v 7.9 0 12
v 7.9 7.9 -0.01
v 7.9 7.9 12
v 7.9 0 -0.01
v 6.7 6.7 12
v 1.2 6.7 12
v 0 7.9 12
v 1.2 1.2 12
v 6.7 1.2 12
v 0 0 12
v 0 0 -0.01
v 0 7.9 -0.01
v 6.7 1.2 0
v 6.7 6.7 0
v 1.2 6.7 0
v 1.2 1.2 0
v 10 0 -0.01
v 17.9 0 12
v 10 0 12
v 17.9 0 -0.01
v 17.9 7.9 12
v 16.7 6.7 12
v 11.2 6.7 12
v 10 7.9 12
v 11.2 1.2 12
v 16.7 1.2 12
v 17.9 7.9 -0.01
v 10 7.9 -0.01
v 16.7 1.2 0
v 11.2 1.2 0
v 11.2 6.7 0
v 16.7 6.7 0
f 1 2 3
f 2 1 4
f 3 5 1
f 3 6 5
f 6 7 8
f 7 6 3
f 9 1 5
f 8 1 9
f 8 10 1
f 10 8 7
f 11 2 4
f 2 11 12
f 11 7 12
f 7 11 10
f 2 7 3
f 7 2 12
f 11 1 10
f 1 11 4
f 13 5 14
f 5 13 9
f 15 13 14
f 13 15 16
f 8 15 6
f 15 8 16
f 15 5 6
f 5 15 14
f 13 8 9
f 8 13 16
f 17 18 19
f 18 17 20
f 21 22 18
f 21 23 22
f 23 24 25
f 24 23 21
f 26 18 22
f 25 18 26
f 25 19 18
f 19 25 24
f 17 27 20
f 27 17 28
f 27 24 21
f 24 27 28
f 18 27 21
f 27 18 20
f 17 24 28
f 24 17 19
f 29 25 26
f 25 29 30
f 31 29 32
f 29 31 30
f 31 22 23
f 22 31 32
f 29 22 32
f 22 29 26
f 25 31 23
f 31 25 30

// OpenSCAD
// file: ../../Base/Boxes.scad
// Fischertechnik Box Foundation
// Pre-designed Boxes

use <Constants.scad>

include <PlacementOptions.scad>

box190Width = 190;
box190Depth = 130;
box130Width = 130;
box130Depth = 95;
boxUsageHeight = 33.9;
boxWallThickness = 2.4;
boxBaseThickness = 1.0;

// getBoxWallThickness()
// Gets the wall thickness of a Fischertechnik Box

function getBoxWallThickness() = boxWallThickness;

// Gets the usable height of a fischertechnik box
function getBoxUsageHeight() = boxUsageHeight;

// Gets the thickness of the Fischertechnik box base.
function getBoxBaseThickness() = boxBaseThickness;

// Gets the usable inner space of a Box 190 as an x/y-list
function getBox190Space() = [
    box190Width - 2*getBoxWallThickness(), 
    box190Depth - 2*getBoxWallThickness() ];

// Imports the Fischertechnik empty box 130x190 mm and places it at position 0,0
// 190x130 are the outer sizes, the inner space is slightly smaller. Use getBox190Space() to get the inner sizes.
// This module needs the STL file "Fischertechnik Box 130x190.stl" in the library path.
// The box is positioned that the usable inner space is at the 0,0,0 position. The

module Box190() {
    translate([-getBoxWallThickness(),-getBoxWallThickness(),-getBoxBaseThickness()])
        import("Fischertechnik Box 130x190.stl", convexity=3);
}

// Gets the usable inner space of a Box 130 as an x/y-list
function getBox130Space() = [
    box130Width - 2*getBoxWallThickness(), 
    box130Depth - 2*getBoxWallThickness() ];

// Imports the Fischertechnik empty box 95x130 mm and places it at position 0,0
// 190x130 are the outer sizes, the inner space is slightly smaller. Use getBox190Space() to get the inner sizes.
// This module needs the STL file "Fischertechnik Box 95x130.stl" in the library path.
// The box is positioned that the usable inner space is at the 0,0,0 position. The

module Box130() {
    translate([-getBoxWallThickness(),-getBoxWallThickness(),-getBoxBaseThickness()])
        import("Fischertechnik Box 95x130.stl", convexity=3);
}

// Creates a web at the specified box walls
// corner 0 = LowerLeft, 1 = UpperLeft, 2 = UpperRight, 3 = LowerRight
// side 0 = LeftOfCorner, 1 = RightOfCorner
// distance = Distance in mm from the corner
// box = inner width and depth of the box (default: Box 190)
// webWidth = length of the web (default is 3 mms)
// webThickness = thickness of the web (default is 1 mm)

module BoxWeb(corner, side, distance, box=getBox190Space(), webWidth=3, webThickness=1.0) {
    sink = getBoxWallThickness()/2;

    width = (corner % 2 == 0) ? 
            (side == LeftOfCorner ? webWidth : webThickness) :
            (side == LeftOfCorner ? webThickness : webWidth);

    depth = (corner % 2 == 0) ? 
            (side == RightOfCorner ? webWidth : webThickness) :
            (side == RightOfCorner ? webThickness : webWidth);
    
    xDiff = corner == LowerLeft ? 
                (side == LeftOfCorner ? -sink : distance) :
            (corner == UpperLeft ?                
                (side == LeftOfCorner ? distance : -sink) :
            (corner == UpperRight ?
                (side == LeftOfCorner ? box.x-webWidth+sink : box.x-distance-webThickness) :
                (side == LeftOfCorner ? box.x-distance-webThickness: box.x-webWidth+sink)));

    yDiff = corner == LowerLeft ? 
                (side == RightOfCorner ? -sink : distance) :
            (corner == UpperLeft ?
                (side == RightOfCorner ? box.y-distance : box.y-webWidth+sink) :
            (corner == UpperRight ?
                (side == RightOfCorner ? box.y-webWidth+sink : box.y-distance) :
                (side == RightOfCorner ? distance : -sink)));
    
    translate([xDiff, yDiff, -getExcess()])
        cube([width, depth, boxUsageHeight + 2*getExcess()]);
}
// file: ../../Base/Rotation.scad
// Fischertechnik Box Foundation
// Geometry Helpers Rotation

include <PlacementOptions.scad>

// getRotatedSpace(space, rotation=NoRotation)
// Rotates the space dependent on the specified rotation

function getRotatedSpace(space, rotation=NoRotation) = [
    (rotation == Rotate90 || rotation == Rotate270) ? space.y : space.x,
    (rotation == Rotate90 || rotation == Rotate270) ? space.x : space.y
];

// Rotates the given space around the fixed left lower corner
// space = the space the children needs as width/depth list [width,depth]
// rotation = 0 Rotate0 degrees, 1 Rotate90 degrees, 2 Rotate180 degrees, 3 Rotate270 degrees (equivalent to -90)

module RotateFix(space, rotation=Rotate0) {
    dy = (rotation == Rotate0 || rotation == Rotate270) ? 0 :
        (rotation == Rotate90) ? space.x :
        space.y;
    dx = (rotation < Rotate180) ? 0 :
        (rotation == Rotate180) ? space.x :
        space.y;
    
    translate([dx, dy, 0])
        rotate([0, 0, rotations[rotation]])
            children();
}
// file: ../../Base/Alignment.scad
// Fischertechnik Box Foundation
// Geometry Helpers Alignment

include <PlacementOptions.scad>

// getAlignedX(elementWidth, spaceWidth, align=AlignRight, offset=0)
// Gets the aligned X offset of an element with the given
// width in the given space.
// elementWidth = The width of the element to positon
// spaceWidth = The space where the element should be aligned
// align = 0 AlignLeft, 1 AlignCenter, 2 AlignRight
// offset = an optional offset from the aligned position. When
// aligned left or centered, then positive values are in X direction.
// When aligned right then positive values are in negative X direction.

function getAlignedX(elementWidth, spaceWidth, align=AlignRight, offset=0) =
    (align == AlignLeft) ?
        offset :
        ((align == AlignCenter) ?
        (spaceWidth - elementWidth)/2 + offset :
        spaceWidth - offset - elementWidth);

// getAlignedY(elementDepth, spaceDepth, align=AlignTop, offset=0)
// Gets the aligned Y offset of an element with the given
// depth in the given space.
// elementDepth = The depth of the element to positon
// spaceDepth = The space where the element should be aligned
// align = 0 AlignBottom, 1 AlignCenter, 2 AlignTop
// offset = an optional offset from the aligned position. When
// aligned bottom or centered, then positive values are in Y direction.
// When aligned top then positive values are in negative Y direction.

function getAlignedY(elementDepth, spaceDepth, align=AlignTop, offset=0) =
    (align == AlignBottom) ?
        offset :
        ((align == AlignCenter) ?
        (spaceDepth - elementDepth)/2 + offset :
        spaceDepth - offset - elementDepth);
// file: ../../Base/Constants.scad
// Fischertechnik Box Foundation
// Constants

// Constant values necessary for multiple elements

// Base constants
dividerThickness = 1.2;
excess = 0.01;
fragments = 90;
tolerance = 0.8;

// Gets the thickness of a divider 
function getDividerThickness() = dividerThickness;

// Gets the excess that is used to merge walls into each other
function getExcess() = excess;

// Gets amount of fragments of a cylinder
function getFragments() = fragments;

// Gets the inner tolerance of a frame to each side
function getTolerance() = tolerance;


// Fischertechnik specific constants
axisDiameter = 4;
axisBottomDiameter = axisDiameter + 1;
standardEdgeDistance = 2.5;
standardWebDistance = 11.5;
standardCornerLength = 15;
tubeWallFactor = 1.6;

// Gets axis diameter
function getAxisDiameter() = axisDiameter;

// Gets axis bottom diameter for thicker part at the bottom
function getAxisBottomDiameter() = axisBottomDiameter;

// gets the standard distance to the wall of the box for dockable frames with webs
function getStandardEdgeDistance() = standardEdgeDistance;

// gets the standard distance of each web to the corner of the dockable frame
function getStandardWebDistance() = standardWebDistance;

// gets the standard length of the corner walls of a dockable frame
function getStandardCornerLength() = standardCornerLength;

// gets the wall thickness of a tube.
function getTubeWallThickness() = tubeWallFactor * getDividerThickness();
// file: ../../Base/PlacementOptions.scad
// Fischertechnik Box Foundation
// Placement Options

// Alignment
NoAlign = 0;
AlignLeft = 1;
AlignBottom = 2;
AlignCenter = 3;
AlignRight = 4;
AlignTop = 5;

// Element rotation degree steps
rotations = [0, -90, -180, -270];

// Rotation
NoRotation = 0;
Rotate0 = 0;
Rotate90 = 1;
Rotate180 = 2;
Rotate270 = 3;

// Docking (seen from above)
NoDock = -1;
DockLeft = 0;
DockTop = 1;
DockRight = 2;
DockCorner = 2;
DockBottom = 3;

// Web corners
LowerLeft = 0;
UpperLeft = 1;
UpperRight = 2;
LowerRight = 3;

// Web position relative to corner
LeftOfCorner = 0;
RightOfCorner = 1;
// file: ../../Elements/FrameControlLight.scad
// Fischertechnik Box Library
// Frame for Control Light for electronic building block
// 36390

use <../Base/Constants.scad>
use <../ModelBase/Simple.scad>

width = 5.5;
depth = 5.5;
height = 12;

// getFrameControlLightSpace()
// Gets the space the frame for a control light needs as width and depth (.x and .y as a list)

function getFrameControlLightSpace() = getFrameOuterVolume([width, depth, height], tolerance=0);

// FrameControlLight()
// The walls of the frame are 12 mm high. 

module FrameControlLight() {
    Frame([width, depth, height], tolerance=0);
}

// Tests
color("lightgray") {
FrameControlLight();
}
// file: ../../Base/Placement.scad
// Fischertechnik Box Foundation
// Geometry Helpers Placement

use <Constants.scad>
use <Alignment.scad>
use <Rotation.scad>
use <Boxes.scad>

include <PlacementOptions.scad>

// Place(x=0, y=0, elementSpace=[0,0], alignX=AlignLeft, alignY=AlignBottom, rotation=Rotate0, boxSpace=getBox190Space())
// Places the child at the specified position
// y = Y-Position. This is a relative position when an X aligment is specified.
// x = X-Position. This is a relative position when an Y aligment is specified.
// elementSpace = space of the element to be placed [x,y]
// alignX = -1=NoAlign, 0 AlignLeft, 1 AlignCenter, 3 AlignRight (elementSpace and boxSpace required!)
// alignY = -1=NoAlign, 2 AlignBottom, 1 AlignCenter, 4 AlignTop (elementSpace and boxSpace required!)
// rotation = 0 Rotate0 0 degrees, 1 Rotate90 90 degrees, 
// 2 Rotate180 180 degrees, 3 Rotate270 270 degrees (equivalent to -90)
// boxSpace = Inner space of the box where the placement occurs [x,y] - default is Box 190x130 inner space

module Place(x=0, y=0, elementSpace=[0,0], 
  alignX=AlignLeft, alignY=AlignBottom, 
  rotation=NoRotation, boxSpace=getBox190Space()) {

    module Position(x, y, space, rotation=Rotate0) {
        translate([x, y, 0])
            RotateFix(space, rotation)
                children(0);
    }

    space = getRotatedSpace(elementSpace, rotation);
    alignedX = getAlignedX(space.x, boxSpace.x, alignX, x);
    alignedY = getAlignedY(space.y, boxSpace.y, alignY, y);
    Position(alignedX, alignedY, elementSpace, rotation)
        children(0);
}

// Center(space=getBox130Space(), elementSpace=[0,0])
// space = Space where the children is centered. For cylinder use centered=true and no elementSpace.
// elementSpace = space of the element to be centered [x,y]

module Center(space=getBox190Space(), elementSpace=[0,0]) {
    translate([(space.x - elementSpace.x) / 2, (space.y - elementSpace.y) / 2])
        children(0);
}

// CenterHorizontal(width=0, y=0, offset=0, space=getBox130Space())
// space = Space where the children is centered. For cylinder use centered=true and no elementSpace.
// elementSpace = space of the element to be centered [x,y]

module CenterHorizontal(width=0, y=0, offset=0, space=getBox190Space()) {
    translate([(space.x - width) / 2 + offset, y])
        children(0);
}

// CenterVertical(depth=0, x=0, offset=0, space=getBox130Space())
// space = Space where the children is centered. For cylinder use centered=true and no elementSpace.
// elementSpace = space of the element to be centered [x,y]

module CenterVerticalal(depth=0, x=0, offset=0, space=getBox190Space()) {
    translate([x, (space.y - depth) / 2 + offset])
        children(0);
}
// main file
// Fischertechnik Box Foundation
// Elements
// Test FrameControlLight

use <../../Base/Placement.scad>
use <../../Elements/FrameControlLight.scad>

include <../../Base/PlacementOptions.scad>

FrameControlLight();

Place(10, 0, elementSpace=getFrameControlLightSpace(), rotation=Rotate90)
    FrameControlLight();
